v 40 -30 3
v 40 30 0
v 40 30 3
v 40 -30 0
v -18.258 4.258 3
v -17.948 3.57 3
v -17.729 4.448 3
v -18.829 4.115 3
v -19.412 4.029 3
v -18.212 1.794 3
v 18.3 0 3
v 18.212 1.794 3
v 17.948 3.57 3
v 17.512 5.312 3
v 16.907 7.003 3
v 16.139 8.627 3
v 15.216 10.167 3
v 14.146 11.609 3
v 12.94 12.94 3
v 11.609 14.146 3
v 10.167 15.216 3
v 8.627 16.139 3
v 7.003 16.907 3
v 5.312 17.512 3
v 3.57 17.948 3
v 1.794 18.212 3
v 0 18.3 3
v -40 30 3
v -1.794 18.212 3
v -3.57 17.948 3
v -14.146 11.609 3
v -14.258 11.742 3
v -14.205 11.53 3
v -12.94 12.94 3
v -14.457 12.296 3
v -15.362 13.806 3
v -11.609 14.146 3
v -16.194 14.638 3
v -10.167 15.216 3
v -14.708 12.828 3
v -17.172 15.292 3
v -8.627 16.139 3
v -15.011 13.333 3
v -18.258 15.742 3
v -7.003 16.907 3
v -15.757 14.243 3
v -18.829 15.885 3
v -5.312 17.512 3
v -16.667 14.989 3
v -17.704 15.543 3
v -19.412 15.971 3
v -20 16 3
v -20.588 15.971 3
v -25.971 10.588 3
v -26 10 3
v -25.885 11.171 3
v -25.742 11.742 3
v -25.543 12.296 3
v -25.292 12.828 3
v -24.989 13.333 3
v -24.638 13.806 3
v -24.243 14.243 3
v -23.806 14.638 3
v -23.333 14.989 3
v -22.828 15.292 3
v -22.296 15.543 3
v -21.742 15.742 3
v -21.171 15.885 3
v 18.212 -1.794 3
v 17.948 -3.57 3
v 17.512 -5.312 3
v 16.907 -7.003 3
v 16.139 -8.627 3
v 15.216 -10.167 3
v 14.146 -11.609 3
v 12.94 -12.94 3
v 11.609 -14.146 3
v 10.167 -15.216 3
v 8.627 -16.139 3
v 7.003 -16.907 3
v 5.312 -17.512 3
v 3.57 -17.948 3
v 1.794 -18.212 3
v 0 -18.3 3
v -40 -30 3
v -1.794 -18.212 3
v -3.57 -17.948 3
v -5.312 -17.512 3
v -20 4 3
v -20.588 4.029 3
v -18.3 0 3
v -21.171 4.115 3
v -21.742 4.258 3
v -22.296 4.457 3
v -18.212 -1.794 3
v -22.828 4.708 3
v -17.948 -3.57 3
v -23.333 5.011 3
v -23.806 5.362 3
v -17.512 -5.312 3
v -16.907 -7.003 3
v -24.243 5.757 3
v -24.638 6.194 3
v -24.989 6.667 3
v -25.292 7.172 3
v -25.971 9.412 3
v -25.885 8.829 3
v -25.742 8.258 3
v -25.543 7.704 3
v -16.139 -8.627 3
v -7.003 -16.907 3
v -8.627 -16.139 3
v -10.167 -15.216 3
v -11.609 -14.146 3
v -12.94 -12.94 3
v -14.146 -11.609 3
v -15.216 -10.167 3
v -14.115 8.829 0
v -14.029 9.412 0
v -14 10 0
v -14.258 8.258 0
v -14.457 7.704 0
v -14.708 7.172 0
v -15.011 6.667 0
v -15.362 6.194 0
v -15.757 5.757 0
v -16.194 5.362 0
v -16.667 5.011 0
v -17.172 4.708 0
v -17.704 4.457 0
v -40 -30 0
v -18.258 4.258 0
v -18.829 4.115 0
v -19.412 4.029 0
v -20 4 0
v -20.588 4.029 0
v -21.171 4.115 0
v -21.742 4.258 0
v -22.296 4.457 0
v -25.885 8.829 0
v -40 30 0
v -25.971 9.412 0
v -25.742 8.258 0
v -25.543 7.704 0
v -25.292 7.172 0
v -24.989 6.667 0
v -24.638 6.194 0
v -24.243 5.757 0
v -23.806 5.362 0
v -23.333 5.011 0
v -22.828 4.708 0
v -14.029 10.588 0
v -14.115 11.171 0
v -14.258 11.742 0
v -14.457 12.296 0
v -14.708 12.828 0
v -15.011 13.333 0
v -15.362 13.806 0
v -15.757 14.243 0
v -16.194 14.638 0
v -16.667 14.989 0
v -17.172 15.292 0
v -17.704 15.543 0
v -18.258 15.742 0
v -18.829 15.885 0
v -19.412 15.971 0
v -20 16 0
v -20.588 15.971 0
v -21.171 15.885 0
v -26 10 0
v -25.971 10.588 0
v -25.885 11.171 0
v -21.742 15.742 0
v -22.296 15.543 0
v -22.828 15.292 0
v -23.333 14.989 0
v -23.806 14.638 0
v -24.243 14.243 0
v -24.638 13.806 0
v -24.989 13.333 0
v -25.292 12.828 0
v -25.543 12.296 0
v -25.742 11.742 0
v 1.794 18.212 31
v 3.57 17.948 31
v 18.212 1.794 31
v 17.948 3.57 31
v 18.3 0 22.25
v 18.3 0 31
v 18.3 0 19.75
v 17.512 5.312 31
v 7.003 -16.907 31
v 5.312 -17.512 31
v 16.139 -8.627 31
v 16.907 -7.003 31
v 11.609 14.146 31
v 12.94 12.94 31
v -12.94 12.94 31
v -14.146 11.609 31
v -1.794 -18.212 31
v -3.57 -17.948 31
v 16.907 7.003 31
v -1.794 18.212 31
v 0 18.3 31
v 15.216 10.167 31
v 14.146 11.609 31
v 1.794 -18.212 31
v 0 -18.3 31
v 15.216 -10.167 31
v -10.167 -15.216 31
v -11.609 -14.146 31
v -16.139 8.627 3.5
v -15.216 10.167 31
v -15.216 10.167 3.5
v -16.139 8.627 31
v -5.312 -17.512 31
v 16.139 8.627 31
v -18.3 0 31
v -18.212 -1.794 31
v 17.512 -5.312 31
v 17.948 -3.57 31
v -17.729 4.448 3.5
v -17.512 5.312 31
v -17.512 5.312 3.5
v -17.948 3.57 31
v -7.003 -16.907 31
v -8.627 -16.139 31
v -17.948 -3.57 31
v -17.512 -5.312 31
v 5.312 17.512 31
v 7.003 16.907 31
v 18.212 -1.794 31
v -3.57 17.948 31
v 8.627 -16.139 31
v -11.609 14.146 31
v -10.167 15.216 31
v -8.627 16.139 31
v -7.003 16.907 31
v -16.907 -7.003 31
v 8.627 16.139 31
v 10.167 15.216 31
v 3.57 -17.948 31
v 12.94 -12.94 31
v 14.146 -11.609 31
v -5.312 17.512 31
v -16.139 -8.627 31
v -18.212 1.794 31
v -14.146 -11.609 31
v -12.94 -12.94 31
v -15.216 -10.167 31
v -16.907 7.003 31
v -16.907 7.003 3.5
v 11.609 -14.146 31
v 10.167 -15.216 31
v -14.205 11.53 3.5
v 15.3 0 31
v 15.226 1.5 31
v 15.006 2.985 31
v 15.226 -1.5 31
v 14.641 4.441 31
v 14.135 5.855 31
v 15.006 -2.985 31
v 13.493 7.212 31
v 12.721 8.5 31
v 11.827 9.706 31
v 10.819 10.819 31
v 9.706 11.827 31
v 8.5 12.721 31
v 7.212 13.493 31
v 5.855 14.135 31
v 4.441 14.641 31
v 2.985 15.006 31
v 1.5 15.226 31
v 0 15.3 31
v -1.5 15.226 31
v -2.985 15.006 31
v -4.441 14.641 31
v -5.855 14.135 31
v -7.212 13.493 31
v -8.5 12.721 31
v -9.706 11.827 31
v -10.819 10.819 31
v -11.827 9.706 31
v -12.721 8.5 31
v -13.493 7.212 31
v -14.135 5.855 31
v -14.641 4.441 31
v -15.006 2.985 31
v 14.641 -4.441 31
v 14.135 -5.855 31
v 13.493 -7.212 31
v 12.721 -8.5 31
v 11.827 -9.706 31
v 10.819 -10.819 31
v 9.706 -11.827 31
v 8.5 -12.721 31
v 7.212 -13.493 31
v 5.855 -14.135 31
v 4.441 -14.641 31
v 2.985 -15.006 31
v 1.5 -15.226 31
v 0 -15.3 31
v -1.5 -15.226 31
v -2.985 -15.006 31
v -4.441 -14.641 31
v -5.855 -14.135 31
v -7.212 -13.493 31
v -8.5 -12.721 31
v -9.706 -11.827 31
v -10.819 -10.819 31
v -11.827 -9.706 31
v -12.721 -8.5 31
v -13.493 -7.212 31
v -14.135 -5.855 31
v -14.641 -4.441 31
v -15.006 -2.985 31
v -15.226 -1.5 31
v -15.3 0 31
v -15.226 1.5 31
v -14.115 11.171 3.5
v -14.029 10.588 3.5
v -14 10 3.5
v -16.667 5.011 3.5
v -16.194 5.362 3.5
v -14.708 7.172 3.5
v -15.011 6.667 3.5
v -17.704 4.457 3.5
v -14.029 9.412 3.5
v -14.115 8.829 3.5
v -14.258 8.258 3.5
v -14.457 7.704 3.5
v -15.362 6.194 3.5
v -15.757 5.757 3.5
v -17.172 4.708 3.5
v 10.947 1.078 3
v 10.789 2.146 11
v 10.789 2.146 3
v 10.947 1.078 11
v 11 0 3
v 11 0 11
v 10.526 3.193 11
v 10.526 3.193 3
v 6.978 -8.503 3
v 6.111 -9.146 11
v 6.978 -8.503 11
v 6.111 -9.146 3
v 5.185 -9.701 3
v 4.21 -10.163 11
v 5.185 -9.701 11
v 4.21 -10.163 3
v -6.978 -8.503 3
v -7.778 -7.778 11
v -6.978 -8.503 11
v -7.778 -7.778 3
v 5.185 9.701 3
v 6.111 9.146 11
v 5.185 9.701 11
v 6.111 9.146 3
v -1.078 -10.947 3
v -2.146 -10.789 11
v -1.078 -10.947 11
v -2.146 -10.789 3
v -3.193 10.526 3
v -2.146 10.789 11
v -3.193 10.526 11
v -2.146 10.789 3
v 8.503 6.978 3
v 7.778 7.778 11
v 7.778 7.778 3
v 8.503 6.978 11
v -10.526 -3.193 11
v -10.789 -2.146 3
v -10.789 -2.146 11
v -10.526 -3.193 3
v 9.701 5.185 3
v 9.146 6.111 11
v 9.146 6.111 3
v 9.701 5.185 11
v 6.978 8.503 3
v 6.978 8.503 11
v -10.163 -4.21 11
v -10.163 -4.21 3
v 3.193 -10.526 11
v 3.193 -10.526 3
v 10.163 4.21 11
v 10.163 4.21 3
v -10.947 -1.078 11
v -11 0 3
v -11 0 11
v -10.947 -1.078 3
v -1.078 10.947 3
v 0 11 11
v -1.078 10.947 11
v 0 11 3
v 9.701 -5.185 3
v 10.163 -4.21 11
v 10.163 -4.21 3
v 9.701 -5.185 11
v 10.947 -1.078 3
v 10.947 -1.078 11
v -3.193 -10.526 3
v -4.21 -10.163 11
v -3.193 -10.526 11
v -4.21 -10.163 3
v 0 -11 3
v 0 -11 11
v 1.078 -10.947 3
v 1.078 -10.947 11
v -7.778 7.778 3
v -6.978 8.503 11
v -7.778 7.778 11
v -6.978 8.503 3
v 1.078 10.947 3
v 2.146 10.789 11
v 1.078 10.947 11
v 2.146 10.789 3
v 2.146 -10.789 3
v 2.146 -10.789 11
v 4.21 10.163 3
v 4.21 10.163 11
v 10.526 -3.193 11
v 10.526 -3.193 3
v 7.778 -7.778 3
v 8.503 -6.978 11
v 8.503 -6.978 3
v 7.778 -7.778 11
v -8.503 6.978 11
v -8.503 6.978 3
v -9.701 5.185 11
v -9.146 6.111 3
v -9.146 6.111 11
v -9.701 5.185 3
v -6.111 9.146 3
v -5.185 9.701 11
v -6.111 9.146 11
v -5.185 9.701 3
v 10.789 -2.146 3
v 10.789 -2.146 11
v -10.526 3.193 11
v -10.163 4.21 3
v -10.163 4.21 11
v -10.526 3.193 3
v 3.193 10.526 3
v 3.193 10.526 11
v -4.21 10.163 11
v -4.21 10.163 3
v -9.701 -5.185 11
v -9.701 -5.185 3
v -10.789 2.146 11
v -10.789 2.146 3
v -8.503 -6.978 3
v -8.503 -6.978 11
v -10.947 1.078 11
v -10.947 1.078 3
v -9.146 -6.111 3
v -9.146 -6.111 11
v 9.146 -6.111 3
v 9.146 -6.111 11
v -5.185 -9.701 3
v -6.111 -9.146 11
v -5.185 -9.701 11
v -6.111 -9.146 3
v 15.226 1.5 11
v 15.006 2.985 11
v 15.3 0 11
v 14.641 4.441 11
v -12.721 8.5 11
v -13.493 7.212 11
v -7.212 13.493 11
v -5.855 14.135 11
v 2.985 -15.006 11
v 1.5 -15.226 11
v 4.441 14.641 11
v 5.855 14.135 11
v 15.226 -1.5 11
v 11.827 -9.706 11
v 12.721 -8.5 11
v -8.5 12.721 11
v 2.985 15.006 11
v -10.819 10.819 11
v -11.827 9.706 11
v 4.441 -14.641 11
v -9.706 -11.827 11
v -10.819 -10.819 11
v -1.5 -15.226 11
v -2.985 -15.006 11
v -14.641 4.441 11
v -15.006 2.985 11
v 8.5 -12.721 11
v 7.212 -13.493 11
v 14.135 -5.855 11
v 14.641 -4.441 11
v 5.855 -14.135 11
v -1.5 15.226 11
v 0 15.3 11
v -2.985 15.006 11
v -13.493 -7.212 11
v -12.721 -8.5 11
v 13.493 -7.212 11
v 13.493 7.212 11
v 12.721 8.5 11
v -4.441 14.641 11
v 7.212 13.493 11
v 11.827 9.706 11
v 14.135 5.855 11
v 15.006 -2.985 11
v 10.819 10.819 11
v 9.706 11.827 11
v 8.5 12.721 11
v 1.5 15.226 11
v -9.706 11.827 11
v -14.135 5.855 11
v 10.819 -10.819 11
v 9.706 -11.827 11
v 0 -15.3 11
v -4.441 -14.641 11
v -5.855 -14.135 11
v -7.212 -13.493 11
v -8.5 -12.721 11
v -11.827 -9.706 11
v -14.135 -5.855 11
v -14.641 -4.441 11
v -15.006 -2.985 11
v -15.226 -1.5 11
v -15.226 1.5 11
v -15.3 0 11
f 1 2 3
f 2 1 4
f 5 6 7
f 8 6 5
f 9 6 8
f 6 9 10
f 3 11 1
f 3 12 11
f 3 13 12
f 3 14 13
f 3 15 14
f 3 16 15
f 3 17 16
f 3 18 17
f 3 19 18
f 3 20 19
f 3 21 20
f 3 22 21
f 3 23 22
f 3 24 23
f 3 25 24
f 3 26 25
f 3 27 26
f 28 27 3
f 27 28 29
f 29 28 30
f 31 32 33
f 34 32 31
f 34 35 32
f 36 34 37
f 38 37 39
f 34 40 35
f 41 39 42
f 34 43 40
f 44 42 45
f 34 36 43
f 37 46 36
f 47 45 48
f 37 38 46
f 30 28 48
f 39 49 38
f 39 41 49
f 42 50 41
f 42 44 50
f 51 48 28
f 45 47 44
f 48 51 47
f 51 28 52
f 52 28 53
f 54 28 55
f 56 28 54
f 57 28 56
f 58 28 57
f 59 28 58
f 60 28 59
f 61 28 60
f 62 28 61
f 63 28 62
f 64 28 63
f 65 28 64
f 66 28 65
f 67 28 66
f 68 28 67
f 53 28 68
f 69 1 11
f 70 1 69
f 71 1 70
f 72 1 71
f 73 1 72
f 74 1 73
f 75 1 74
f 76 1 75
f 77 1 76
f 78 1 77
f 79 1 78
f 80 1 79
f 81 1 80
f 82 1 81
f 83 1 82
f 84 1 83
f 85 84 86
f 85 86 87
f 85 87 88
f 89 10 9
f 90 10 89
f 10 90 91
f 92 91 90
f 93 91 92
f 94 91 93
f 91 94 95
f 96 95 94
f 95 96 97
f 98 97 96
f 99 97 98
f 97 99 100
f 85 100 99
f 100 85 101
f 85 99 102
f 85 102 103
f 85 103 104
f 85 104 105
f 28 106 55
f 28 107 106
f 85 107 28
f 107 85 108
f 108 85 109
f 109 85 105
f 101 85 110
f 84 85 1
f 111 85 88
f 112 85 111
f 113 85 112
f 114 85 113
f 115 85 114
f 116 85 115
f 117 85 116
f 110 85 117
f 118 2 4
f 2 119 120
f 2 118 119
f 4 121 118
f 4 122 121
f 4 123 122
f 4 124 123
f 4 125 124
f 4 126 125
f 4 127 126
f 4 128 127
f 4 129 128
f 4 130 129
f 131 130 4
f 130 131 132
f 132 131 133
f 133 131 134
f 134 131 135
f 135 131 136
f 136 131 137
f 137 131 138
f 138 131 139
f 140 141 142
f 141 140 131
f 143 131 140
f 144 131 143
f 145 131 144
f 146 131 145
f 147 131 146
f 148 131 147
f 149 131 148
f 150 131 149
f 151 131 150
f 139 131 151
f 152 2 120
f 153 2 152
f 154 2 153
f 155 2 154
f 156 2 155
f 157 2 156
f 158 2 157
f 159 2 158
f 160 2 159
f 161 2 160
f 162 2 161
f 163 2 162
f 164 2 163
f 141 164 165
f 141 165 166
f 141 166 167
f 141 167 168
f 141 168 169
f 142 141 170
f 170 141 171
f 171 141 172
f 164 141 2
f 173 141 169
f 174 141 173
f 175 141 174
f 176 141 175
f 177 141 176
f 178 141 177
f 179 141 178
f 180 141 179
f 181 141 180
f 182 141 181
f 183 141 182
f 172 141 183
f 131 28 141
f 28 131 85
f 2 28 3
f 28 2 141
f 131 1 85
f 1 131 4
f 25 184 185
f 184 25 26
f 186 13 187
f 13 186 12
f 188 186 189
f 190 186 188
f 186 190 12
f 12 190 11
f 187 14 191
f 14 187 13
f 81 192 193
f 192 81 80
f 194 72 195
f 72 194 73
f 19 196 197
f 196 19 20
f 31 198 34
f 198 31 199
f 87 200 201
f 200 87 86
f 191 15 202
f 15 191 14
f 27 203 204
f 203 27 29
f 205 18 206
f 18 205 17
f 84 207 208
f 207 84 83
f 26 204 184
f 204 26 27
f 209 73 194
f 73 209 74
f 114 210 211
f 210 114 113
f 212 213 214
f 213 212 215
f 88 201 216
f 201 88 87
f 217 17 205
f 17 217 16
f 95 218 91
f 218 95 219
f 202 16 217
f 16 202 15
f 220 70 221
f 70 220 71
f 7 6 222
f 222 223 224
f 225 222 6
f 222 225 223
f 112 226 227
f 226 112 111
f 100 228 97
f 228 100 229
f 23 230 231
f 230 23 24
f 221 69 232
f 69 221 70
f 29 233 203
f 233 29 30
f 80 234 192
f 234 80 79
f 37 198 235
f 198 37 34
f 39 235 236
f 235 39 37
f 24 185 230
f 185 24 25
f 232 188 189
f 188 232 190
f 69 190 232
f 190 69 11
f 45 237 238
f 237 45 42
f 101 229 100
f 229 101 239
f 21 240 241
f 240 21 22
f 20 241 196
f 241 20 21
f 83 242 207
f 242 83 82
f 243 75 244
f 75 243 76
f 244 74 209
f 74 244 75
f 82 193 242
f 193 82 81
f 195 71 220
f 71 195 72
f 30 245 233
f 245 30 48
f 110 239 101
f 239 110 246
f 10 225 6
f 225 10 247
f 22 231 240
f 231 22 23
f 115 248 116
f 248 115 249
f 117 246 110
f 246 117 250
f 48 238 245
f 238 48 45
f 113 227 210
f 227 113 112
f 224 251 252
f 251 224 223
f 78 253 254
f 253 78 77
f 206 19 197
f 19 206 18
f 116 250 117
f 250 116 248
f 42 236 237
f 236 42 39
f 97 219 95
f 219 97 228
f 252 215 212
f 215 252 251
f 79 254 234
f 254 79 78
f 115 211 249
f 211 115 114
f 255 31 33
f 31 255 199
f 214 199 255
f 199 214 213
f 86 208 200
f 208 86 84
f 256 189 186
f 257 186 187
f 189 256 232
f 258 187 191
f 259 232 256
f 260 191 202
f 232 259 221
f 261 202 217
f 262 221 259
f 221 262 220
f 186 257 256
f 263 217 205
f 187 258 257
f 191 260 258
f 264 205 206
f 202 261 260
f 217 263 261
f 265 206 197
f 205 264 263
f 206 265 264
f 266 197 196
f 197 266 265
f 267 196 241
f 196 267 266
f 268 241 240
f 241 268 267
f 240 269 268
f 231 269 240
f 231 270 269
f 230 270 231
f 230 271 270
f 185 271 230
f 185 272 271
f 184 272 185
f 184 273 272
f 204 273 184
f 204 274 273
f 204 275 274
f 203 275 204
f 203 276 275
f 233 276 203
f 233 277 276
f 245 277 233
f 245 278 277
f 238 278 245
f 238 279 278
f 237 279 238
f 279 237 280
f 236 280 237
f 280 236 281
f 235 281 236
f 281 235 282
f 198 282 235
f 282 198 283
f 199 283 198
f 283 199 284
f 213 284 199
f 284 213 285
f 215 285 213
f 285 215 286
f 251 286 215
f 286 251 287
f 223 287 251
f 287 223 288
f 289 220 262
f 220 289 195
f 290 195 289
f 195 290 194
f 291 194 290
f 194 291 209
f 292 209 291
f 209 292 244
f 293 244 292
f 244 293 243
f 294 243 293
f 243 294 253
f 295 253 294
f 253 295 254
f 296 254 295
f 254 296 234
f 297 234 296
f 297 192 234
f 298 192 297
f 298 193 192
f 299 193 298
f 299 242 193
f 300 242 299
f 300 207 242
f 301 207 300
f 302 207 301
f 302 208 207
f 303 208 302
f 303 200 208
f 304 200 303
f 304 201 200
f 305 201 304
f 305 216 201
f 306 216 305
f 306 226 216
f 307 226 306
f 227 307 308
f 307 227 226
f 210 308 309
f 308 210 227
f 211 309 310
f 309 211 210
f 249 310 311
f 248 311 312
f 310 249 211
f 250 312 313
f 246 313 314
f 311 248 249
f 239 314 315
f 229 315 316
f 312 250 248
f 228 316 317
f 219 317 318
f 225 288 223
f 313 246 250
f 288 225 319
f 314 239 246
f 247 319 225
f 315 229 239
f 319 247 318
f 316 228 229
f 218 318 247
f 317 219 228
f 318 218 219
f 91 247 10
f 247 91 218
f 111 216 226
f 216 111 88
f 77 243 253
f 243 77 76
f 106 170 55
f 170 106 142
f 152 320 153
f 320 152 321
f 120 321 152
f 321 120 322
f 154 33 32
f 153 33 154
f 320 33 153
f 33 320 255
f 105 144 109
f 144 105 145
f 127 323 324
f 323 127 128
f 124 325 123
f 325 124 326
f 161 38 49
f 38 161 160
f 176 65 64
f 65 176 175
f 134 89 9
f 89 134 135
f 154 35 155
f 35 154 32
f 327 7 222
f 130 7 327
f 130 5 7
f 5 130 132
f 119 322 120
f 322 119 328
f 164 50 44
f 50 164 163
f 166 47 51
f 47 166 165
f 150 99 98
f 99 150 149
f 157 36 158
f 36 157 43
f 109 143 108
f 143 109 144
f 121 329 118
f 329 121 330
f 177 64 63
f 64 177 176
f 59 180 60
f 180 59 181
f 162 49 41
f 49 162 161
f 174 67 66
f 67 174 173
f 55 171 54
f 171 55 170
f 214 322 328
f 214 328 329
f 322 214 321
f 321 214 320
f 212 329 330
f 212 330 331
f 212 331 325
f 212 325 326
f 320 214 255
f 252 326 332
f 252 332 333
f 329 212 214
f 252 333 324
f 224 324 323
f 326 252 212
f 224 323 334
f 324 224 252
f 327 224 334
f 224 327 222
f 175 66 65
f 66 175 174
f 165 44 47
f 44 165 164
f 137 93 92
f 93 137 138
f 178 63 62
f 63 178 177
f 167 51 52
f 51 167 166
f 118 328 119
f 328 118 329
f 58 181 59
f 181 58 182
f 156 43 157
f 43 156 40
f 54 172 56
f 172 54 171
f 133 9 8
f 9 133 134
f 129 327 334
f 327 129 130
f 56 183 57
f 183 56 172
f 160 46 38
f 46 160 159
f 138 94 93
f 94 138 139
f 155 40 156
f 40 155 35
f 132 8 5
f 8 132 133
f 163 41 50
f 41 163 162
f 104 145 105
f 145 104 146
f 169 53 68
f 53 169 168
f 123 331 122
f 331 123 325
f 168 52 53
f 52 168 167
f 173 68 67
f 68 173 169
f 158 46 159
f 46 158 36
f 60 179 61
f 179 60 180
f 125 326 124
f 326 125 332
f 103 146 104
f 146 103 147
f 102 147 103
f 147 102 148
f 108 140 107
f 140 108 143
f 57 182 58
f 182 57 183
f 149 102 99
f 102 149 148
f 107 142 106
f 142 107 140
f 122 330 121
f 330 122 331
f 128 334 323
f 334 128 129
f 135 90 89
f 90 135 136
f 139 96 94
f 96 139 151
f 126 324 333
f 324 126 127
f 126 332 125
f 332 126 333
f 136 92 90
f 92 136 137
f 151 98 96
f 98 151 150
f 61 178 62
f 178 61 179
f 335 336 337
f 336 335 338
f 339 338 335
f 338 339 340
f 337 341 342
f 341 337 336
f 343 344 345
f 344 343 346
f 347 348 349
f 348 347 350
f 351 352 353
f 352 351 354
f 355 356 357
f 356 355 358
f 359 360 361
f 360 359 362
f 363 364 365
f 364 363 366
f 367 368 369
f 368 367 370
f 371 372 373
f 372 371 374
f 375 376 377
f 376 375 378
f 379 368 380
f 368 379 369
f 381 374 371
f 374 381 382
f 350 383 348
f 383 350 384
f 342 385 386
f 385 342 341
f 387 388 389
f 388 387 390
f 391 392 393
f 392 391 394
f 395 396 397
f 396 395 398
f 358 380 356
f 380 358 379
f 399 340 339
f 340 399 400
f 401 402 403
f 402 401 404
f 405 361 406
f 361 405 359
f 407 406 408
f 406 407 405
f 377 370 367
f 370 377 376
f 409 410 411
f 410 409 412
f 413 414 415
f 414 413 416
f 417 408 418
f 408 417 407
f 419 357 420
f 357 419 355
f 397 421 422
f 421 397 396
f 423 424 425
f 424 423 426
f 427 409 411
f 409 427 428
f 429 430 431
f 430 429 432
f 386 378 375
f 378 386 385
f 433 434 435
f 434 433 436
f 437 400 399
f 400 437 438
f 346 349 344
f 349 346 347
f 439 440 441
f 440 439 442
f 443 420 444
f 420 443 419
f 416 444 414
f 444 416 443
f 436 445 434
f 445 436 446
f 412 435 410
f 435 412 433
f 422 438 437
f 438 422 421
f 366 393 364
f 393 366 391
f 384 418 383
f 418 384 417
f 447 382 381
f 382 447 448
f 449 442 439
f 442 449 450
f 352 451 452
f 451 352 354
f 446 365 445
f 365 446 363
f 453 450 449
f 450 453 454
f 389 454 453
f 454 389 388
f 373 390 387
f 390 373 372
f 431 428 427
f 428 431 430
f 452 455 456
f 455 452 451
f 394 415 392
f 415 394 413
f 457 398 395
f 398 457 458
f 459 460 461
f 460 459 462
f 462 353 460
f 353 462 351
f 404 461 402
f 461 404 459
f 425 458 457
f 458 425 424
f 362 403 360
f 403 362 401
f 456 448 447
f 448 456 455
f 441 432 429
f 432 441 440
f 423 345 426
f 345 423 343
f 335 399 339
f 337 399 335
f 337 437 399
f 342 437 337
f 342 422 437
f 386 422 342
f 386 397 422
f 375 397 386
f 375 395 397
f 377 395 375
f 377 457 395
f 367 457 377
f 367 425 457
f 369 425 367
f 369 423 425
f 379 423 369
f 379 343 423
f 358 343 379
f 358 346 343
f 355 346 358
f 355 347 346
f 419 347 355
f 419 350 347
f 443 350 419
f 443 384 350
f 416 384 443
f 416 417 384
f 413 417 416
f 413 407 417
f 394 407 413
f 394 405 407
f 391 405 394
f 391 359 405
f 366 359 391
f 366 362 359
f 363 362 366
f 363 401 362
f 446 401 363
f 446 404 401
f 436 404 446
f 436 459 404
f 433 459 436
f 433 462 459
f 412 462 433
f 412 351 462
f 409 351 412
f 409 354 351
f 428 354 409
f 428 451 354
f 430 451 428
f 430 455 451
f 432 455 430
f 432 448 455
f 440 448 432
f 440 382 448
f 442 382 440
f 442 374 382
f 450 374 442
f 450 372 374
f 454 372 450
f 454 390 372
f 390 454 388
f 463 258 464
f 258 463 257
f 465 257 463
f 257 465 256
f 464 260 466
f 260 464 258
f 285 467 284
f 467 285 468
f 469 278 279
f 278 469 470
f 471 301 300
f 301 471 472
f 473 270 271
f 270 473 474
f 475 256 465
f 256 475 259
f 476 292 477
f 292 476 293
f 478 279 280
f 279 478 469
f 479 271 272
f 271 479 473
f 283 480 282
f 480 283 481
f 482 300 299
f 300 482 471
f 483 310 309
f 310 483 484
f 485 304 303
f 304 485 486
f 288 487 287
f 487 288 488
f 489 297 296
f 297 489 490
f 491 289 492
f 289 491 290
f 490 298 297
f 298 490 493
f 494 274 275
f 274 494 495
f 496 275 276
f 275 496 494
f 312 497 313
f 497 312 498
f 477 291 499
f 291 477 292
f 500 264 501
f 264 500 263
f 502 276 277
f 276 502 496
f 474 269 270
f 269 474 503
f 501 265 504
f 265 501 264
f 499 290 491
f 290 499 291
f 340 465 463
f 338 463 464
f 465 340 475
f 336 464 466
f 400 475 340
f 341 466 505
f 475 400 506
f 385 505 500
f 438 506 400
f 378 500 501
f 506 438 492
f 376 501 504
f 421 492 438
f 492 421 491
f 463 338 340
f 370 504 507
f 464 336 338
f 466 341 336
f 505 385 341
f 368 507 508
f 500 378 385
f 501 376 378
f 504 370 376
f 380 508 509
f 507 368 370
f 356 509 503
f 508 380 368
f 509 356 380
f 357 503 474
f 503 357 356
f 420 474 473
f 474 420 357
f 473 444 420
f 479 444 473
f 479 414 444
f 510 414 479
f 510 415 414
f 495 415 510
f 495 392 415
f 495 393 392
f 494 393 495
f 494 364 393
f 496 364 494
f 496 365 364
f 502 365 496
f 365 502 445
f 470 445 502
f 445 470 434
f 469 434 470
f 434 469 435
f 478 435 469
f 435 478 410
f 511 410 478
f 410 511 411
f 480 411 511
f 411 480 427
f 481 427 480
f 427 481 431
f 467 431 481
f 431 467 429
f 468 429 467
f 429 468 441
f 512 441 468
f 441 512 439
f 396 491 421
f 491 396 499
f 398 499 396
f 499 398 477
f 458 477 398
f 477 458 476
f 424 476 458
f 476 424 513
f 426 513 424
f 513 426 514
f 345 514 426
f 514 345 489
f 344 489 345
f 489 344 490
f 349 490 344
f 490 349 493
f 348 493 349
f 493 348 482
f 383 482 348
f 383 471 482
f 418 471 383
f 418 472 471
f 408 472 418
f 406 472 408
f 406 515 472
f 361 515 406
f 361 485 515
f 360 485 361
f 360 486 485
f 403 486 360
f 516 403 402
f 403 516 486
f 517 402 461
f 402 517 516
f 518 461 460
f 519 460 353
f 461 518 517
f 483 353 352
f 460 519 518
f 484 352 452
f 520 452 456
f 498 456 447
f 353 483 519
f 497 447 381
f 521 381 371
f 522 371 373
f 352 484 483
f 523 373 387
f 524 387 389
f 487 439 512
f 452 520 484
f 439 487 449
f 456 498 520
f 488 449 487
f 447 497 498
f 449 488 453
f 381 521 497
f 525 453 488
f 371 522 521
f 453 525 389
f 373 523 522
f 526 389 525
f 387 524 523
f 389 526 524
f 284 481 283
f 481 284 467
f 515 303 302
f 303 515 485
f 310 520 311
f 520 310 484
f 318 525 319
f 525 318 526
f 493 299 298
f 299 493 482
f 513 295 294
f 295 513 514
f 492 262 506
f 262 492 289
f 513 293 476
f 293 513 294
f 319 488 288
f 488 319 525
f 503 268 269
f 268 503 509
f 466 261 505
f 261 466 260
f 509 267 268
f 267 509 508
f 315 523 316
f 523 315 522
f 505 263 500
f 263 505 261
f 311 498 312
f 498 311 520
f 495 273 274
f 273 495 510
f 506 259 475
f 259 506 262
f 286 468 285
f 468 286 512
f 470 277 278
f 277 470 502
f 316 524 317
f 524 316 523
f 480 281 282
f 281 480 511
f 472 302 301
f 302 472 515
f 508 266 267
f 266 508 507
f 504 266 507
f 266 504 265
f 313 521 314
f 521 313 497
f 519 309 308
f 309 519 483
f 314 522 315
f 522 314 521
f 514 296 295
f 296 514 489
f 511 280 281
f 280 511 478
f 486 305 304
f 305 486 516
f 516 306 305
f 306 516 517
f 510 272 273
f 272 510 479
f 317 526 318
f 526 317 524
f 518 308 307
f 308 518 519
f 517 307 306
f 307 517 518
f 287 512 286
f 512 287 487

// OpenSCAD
// Microscope Eyepiece to Phone Camera Adapter
// Corrected version: Screw holes now correctly positioned on the sleeve wall.

// --- Dimensions ---
plate_x      = 80.0;    // Plate width (X)
plate_y      = 60.0;    // Plate depth (Y)
plate_t      = 3.0;     // Plate thickness
cam_hole_d   = 12.0;    // Diameter of camera hole
cam_hole_x   = -20.0;   // X position of camera hole
cam_hole_y   = 10.0;    // Y position of camera hole

sleeve_od    = 36.6;    // Outer diameter of the sleeve
sleeve_h     = 28.0;    // Height of the sleeve (31 - 3)
stop_bore_d  = 22.0;    // Diameter of the stop bore (z=3 to z=11)
stop_h       = 8.0;     // Height of the stop bore (11 - 3)
eye_bore_d   = 30.6;    // Diameter of the eyepiece bore (z=11 to top)

screw_hole_d  = 2.5;    // Diameter of the M3 centering screw holes
screw_z       = 21.0;   // Z height of the screw holes
num_screws    = 3;      // Number of radial screw holes
screw_angle    = 120;    // Angular spacing between screws

$fn = 64;

// --- Main Assembly ---

difference() {
    union() {
        // The Base Plate
        translate([-plate_x/2, -plate_y/2, 0])
            cube([plate_x, plate_y, plate_t]);

        // The Sleeve
        translate([0, 0, plate_t])
            cylinder(h = sleeve_h, d = sleeve_od);
    }

    // 1. Camera Hole (through the plate)
    translate([cam_hole_x, cam_hole_y, -0.5])
        cylinder(h = plate_t + 1, d = cam_hole_d);

    // 2. Stop Bore (inner diameter from z=3 to z=11)
    translate([0, 0, plate_t])
        cylinder(h = stop_h + 0.1, d = stop_bore_d);

    // 3. Eyepiece Bore (inner diameter from z=11 to top)
    translate([0, 0, plate_t + stop_h])
        cylinder(h = sleeve_h - stop_h + 1, d = eye_bore_d);

    // 4. Radial Screw Holes
    // We translate the hole to the radius of the sleeve so it cuts the wall.
    for (i = [0 : num_screws - 1]) {
        angle = i * screw_angle;
        rotate([0, 0, angle])
            translate([sleeve_od / 2, 0, screw_z])
                rotate([0, 90, 0])
                    cylinder(h = sleeve_od, d = screw_hole_d);
    }
}
